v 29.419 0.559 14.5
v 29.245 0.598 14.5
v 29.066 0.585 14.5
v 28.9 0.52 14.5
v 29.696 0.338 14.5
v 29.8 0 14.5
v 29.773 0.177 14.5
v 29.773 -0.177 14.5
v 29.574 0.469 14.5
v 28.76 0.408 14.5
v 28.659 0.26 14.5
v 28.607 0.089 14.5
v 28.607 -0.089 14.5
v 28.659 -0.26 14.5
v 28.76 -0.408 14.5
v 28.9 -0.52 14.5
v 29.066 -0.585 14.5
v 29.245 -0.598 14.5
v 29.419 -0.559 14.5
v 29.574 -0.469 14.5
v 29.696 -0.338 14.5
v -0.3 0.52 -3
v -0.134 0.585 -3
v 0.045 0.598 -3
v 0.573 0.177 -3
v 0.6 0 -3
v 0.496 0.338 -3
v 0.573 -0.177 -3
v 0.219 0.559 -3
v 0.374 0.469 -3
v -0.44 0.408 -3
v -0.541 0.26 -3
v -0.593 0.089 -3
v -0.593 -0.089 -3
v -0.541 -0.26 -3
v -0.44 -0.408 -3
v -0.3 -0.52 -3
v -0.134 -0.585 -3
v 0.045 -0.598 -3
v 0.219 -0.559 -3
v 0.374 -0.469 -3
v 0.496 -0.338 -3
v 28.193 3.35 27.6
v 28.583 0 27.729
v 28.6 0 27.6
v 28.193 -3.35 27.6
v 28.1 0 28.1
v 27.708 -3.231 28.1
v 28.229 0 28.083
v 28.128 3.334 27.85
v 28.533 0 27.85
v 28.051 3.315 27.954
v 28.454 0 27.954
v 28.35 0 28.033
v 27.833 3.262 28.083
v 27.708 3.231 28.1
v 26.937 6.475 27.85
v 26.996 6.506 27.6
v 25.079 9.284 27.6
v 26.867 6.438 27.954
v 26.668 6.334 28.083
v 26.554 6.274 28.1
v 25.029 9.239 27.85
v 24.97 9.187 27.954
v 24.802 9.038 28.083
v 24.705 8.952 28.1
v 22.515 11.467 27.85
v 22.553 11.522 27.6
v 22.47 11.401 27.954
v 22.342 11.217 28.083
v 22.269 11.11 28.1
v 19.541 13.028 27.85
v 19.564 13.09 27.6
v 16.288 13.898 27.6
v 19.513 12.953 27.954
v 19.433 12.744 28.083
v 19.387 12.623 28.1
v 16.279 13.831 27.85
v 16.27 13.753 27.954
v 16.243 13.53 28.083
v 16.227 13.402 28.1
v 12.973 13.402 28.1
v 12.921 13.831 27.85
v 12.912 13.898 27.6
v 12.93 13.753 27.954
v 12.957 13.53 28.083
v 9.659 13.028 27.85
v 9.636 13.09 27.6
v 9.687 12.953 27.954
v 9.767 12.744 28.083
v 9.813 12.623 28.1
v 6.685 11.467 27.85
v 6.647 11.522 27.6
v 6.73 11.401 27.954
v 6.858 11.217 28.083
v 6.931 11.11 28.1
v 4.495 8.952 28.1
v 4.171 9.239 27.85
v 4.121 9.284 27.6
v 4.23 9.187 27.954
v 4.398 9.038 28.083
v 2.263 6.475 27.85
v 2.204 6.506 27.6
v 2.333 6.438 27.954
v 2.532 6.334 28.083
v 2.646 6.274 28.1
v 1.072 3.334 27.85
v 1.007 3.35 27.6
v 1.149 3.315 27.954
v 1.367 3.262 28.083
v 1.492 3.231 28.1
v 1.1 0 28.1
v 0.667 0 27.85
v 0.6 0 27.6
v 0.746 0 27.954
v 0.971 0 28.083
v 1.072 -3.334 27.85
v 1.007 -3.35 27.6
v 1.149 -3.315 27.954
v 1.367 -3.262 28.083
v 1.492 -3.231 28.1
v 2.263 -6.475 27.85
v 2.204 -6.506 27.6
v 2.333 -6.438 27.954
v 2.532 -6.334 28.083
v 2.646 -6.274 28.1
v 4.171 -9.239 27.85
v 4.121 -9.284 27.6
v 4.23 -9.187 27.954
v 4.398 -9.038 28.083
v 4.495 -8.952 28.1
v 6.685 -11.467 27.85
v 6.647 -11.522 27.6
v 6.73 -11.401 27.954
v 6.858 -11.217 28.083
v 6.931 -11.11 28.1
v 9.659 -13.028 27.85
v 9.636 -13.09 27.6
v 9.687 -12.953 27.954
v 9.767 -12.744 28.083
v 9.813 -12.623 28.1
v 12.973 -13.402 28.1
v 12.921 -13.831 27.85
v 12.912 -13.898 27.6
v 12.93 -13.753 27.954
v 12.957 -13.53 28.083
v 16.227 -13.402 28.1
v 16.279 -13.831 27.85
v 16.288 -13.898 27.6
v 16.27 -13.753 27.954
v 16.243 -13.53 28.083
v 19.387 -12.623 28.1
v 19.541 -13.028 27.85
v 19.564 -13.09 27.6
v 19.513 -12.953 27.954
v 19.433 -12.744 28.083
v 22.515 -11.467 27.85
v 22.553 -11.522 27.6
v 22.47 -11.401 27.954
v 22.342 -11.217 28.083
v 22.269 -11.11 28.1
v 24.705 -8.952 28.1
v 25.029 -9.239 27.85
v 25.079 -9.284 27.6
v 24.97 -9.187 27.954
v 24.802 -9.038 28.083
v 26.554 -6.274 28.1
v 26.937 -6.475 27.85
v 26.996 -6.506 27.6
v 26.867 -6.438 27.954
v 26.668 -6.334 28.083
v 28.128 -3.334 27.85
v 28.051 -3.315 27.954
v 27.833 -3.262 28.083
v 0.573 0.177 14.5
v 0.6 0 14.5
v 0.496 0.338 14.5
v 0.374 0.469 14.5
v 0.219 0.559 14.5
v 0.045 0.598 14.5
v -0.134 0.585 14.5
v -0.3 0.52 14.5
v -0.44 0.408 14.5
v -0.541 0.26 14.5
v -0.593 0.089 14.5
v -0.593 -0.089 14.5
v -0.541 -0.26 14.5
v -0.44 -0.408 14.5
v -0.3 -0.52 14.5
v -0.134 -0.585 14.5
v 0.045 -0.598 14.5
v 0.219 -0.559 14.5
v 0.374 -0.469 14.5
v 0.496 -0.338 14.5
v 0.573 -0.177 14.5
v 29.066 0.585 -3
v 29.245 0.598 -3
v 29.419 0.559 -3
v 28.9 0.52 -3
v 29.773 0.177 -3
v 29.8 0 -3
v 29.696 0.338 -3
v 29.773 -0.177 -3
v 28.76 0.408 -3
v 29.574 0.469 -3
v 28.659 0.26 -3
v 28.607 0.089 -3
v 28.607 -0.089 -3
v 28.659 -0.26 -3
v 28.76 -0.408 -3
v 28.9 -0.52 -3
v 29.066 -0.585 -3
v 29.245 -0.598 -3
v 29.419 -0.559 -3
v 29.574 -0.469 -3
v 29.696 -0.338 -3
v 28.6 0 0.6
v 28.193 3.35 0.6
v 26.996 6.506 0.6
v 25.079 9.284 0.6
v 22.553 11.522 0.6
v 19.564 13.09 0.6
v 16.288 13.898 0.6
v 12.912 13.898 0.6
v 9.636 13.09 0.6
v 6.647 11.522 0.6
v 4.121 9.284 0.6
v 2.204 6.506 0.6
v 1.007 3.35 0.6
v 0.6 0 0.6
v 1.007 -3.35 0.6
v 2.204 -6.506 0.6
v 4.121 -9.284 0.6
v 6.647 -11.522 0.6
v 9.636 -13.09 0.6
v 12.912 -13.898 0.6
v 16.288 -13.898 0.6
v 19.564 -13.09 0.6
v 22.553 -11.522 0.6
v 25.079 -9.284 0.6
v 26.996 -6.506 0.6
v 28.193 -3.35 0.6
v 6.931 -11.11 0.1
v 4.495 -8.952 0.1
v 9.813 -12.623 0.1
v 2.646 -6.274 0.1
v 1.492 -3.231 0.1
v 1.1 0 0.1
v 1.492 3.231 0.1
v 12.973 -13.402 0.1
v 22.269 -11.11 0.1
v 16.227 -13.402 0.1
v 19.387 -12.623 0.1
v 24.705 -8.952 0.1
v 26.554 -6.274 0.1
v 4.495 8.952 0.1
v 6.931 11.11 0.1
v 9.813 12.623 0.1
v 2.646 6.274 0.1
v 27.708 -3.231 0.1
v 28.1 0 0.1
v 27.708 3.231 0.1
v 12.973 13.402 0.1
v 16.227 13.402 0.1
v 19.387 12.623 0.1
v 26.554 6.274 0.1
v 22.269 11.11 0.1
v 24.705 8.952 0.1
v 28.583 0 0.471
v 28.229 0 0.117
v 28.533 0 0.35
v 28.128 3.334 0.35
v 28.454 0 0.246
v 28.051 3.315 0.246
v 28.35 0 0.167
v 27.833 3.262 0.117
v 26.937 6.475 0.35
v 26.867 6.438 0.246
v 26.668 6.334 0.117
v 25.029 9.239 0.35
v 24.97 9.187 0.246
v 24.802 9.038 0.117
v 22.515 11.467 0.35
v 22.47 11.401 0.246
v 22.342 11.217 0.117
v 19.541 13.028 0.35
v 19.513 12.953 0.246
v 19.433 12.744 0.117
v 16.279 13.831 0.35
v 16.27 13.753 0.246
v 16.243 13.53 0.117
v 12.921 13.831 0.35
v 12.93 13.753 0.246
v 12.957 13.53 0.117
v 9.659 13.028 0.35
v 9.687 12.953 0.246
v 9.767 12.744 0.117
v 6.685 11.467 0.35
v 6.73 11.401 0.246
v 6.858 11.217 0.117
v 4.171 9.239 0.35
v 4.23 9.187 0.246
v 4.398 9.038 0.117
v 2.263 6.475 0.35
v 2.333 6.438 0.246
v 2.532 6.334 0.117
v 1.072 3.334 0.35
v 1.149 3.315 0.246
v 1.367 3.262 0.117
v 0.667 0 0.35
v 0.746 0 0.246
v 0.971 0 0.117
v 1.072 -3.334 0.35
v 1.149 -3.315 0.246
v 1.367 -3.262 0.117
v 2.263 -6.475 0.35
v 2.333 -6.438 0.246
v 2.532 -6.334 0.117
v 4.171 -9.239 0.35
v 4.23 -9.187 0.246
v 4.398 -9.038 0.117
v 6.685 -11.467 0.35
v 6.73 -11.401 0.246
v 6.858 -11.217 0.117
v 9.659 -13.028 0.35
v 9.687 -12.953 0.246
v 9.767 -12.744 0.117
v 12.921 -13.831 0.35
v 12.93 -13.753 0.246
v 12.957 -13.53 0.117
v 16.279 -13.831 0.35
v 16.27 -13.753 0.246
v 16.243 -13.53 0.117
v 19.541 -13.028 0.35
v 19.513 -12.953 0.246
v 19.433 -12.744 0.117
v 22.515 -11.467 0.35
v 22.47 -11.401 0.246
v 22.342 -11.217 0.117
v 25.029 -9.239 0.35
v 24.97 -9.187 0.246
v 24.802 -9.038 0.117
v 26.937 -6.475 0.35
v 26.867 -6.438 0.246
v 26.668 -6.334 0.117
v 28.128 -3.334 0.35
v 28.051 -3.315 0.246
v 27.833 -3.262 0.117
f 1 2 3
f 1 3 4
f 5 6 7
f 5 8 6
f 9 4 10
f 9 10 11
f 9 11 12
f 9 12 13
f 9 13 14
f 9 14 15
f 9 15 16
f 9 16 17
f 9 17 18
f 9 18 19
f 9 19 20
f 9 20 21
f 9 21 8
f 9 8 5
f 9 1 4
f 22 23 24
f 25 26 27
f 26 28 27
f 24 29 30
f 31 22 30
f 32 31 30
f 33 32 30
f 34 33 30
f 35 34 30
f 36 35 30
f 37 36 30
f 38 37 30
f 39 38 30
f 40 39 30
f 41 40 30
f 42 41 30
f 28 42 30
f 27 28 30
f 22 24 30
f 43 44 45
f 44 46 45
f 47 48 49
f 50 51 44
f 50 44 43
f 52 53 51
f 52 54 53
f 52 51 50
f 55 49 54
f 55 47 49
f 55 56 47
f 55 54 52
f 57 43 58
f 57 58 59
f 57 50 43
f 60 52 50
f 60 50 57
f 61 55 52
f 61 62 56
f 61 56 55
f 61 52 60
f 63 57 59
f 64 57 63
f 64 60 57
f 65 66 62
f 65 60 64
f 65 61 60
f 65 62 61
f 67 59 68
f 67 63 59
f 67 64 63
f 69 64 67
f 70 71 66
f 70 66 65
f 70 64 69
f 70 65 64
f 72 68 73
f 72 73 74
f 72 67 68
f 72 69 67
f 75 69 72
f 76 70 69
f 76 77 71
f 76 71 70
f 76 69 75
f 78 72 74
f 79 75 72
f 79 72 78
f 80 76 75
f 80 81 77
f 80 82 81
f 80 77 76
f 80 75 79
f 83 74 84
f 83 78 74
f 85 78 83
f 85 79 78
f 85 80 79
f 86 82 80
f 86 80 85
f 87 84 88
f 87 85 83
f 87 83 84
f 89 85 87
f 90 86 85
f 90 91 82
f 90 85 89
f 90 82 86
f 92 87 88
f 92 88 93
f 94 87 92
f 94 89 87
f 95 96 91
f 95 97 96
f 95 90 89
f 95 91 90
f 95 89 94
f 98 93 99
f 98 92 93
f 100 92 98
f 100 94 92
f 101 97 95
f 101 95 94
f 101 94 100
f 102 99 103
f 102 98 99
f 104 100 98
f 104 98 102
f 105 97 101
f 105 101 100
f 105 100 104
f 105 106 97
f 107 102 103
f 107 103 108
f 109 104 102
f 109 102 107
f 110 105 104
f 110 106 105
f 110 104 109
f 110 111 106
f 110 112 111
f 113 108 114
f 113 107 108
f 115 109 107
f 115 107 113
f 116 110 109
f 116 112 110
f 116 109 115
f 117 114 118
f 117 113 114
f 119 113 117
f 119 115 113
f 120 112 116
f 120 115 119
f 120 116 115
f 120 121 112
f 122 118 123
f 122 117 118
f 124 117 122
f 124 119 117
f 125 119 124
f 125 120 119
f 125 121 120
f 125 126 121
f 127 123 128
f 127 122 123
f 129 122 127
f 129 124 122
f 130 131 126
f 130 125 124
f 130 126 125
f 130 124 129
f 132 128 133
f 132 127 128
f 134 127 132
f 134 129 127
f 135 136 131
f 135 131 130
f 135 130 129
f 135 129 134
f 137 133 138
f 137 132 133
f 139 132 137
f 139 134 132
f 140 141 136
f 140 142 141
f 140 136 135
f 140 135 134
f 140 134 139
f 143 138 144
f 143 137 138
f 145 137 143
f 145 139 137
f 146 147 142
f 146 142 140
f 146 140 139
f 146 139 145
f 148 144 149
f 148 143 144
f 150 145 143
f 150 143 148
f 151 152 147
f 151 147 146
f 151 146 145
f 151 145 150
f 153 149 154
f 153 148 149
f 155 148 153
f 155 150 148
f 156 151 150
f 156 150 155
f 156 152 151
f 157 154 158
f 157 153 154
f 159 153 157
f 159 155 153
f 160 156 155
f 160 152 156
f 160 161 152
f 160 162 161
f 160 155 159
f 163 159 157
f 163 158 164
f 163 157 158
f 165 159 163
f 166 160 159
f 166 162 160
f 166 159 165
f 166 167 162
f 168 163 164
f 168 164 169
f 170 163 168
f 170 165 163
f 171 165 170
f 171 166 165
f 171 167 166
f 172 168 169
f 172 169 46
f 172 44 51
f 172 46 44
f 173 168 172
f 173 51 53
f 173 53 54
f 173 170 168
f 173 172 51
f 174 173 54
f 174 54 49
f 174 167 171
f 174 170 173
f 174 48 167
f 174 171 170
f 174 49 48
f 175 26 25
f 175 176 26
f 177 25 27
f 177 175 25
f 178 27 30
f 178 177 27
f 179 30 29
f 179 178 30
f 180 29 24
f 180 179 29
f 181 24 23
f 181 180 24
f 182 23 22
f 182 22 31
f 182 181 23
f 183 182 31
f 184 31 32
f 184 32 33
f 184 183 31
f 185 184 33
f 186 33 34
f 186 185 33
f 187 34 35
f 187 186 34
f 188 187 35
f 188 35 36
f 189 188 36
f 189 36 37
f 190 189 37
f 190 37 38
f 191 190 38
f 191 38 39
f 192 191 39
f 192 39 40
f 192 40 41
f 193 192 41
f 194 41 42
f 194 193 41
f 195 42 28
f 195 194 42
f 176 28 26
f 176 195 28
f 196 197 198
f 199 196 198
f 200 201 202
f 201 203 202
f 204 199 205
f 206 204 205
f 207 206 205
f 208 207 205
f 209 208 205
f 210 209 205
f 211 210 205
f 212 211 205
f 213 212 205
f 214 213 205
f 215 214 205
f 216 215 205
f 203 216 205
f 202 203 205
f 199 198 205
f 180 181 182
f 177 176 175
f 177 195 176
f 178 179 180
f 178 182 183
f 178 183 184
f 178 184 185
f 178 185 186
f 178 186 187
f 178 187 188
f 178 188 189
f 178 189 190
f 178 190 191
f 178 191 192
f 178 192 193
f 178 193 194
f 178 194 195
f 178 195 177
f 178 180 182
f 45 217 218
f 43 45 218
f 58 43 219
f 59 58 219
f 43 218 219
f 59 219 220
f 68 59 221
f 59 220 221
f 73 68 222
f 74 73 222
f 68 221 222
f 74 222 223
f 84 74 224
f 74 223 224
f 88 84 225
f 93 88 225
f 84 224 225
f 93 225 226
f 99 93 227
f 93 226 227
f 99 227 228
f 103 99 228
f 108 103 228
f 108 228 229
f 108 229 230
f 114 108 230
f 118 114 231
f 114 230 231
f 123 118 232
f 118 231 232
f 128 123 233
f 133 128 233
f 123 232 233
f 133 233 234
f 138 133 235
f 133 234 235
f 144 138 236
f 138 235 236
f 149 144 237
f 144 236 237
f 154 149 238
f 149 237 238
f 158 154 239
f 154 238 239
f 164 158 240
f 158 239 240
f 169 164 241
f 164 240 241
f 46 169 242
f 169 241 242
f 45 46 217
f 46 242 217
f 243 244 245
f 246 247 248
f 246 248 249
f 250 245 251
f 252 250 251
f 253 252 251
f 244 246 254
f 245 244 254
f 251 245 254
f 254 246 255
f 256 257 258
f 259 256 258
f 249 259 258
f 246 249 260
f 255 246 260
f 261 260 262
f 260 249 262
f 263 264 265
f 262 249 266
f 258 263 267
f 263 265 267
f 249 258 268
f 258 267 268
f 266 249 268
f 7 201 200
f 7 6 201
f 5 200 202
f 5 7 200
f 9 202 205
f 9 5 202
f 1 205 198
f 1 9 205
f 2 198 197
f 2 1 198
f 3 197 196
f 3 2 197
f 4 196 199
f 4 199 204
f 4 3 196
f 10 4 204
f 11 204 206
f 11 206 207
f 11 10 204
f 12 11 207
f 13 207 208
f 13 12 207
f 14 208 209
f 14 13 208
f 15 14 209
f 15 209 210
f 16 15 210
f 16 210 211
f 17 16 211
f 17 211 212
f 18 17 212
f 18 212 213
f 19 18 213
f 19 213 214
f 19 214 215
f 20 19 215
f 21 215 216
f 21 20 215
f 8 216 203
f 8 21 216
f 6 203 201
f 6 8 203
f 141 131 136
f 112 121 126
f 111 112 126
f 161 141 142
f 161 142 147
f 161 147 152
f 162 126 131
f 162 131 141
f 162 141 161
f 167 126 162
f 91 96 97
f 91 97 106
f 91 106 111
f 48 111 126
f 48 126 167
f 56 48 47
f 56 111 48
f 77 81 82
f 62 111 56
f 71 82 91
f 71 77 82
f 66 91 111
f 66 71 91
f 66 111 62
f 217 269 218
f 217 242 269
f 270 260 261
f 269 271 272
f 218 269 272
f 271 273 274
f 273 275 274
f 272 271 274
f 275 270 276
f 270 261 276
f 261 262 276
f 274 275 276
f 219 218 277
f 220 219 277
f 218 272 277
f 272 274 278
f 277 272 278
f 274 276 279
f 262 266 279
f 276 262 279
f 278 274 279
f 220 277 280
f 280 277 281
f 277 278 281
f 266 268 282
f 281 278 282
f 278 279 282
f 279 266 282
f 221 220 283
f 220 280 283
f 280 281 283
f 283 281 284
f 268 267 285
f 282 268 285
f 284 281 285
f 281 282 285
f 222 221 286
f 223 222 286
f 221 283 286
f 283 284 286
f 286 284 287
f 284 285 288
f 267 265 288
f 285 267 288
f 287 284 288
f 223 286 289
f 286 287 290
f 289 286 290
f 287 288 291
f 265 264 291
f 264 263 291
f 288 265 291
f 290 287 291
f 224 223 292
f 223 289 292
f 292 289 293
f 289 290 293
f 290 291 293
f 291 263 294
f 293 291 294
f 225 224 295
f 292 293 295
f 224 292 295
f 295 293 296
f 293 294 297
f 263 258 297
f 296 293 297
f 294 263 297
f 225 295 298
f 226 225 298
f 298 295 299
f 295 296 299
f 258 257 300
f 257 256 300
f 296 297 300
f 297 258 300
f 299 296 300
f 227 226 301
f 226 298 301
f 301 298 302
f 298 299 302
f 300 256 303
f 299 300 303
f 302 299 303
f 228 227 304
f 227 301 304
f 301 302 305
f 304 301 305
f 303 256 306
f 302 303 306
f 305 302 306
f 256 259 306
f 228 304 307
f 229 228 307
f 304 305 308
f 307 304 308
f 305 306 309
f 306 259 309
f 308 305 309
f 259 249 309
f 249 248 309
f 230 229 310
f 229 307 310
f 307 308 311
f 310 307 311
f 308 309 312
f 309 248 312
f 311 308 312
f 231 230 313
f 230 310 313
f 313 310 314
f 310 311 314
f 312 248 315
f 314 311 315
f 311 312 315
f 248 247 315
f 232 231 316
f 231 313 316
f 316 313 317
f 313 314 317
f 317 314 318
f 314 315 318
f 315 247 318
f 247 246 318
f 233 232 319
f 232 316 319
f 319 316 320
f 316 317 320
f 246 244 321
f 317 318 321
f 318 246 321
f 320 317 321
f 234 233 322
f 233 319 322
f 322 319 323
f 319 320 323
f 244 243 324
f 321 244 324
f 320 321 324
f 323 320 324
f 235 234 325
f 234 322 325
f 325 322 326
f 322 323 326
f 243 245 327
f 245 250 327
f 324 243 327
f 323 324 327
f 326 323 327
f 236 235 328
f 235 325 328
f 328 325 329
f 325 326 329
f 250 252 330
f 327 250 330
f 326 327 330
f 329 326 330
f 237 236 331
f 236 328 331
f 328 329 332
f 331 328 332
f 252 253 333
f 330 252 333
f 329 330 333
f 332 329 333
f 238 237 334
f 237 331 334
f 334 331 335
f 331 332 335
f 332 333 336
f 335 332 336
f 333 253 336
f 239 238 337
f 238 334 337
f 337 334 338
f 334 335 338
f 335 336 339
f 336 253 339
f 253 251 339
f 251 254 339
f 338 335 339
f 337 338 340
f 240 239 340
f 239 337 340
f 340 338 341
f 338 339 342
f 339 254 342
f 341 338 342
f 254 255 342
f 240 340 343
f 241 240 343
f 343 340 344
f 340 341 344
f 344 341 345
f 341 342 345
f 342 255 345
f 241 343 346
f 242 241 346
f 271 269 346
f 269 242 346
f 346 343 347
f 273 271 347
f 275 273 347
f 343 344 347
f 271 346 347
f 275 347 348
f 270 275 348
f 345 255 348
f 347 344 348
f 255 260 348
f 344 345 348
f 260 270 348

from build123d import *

# Parameters (mm, degrees)
SKETCH001_R       = 0.6
PAD001_DEPTH      = 14
PAD001_DEPTH_BACK = 3.5
SKETCH_R          = 14
PAD_DEPTH         = 28
FILLET_R          = 0.5


with BuildPart() as pad001:
    # Sketch001 → Pad001 (new body, two sides)
    with BuildSketch(Plane.XY.offset(0.5)) as pad001_sk:
        Circle(SKETCH001_R)
        with Locations((29.2, 0)):
            Circle(SKETCH001_R)
    extrude(amount=PAD001_DEPTH)
    extrude(pad001_sk.sketch, amount=-PAD001_DEPTH_BACK)


with BuildPart() as fillet_body:
    # Sketch → Pad (new body)
    with BuildSketch(Plane.XY.offset(0.1)):
        with Locations((14.6, 0)):
            Circle(SKETCH_R)
    extrude(amount=PAD_DEPTH)

    # Fillet
    fillet_edges = [fillet_body.edges().sort_by_distance(p)[0] for p in [
        (0.6, 0, 0.1),
        (0.6, 0, 28.1),
    ]]
    fillet(fillet_edges, radius=FILLET_R)


solid = Compound([pad001.part, fillet_body.part])
